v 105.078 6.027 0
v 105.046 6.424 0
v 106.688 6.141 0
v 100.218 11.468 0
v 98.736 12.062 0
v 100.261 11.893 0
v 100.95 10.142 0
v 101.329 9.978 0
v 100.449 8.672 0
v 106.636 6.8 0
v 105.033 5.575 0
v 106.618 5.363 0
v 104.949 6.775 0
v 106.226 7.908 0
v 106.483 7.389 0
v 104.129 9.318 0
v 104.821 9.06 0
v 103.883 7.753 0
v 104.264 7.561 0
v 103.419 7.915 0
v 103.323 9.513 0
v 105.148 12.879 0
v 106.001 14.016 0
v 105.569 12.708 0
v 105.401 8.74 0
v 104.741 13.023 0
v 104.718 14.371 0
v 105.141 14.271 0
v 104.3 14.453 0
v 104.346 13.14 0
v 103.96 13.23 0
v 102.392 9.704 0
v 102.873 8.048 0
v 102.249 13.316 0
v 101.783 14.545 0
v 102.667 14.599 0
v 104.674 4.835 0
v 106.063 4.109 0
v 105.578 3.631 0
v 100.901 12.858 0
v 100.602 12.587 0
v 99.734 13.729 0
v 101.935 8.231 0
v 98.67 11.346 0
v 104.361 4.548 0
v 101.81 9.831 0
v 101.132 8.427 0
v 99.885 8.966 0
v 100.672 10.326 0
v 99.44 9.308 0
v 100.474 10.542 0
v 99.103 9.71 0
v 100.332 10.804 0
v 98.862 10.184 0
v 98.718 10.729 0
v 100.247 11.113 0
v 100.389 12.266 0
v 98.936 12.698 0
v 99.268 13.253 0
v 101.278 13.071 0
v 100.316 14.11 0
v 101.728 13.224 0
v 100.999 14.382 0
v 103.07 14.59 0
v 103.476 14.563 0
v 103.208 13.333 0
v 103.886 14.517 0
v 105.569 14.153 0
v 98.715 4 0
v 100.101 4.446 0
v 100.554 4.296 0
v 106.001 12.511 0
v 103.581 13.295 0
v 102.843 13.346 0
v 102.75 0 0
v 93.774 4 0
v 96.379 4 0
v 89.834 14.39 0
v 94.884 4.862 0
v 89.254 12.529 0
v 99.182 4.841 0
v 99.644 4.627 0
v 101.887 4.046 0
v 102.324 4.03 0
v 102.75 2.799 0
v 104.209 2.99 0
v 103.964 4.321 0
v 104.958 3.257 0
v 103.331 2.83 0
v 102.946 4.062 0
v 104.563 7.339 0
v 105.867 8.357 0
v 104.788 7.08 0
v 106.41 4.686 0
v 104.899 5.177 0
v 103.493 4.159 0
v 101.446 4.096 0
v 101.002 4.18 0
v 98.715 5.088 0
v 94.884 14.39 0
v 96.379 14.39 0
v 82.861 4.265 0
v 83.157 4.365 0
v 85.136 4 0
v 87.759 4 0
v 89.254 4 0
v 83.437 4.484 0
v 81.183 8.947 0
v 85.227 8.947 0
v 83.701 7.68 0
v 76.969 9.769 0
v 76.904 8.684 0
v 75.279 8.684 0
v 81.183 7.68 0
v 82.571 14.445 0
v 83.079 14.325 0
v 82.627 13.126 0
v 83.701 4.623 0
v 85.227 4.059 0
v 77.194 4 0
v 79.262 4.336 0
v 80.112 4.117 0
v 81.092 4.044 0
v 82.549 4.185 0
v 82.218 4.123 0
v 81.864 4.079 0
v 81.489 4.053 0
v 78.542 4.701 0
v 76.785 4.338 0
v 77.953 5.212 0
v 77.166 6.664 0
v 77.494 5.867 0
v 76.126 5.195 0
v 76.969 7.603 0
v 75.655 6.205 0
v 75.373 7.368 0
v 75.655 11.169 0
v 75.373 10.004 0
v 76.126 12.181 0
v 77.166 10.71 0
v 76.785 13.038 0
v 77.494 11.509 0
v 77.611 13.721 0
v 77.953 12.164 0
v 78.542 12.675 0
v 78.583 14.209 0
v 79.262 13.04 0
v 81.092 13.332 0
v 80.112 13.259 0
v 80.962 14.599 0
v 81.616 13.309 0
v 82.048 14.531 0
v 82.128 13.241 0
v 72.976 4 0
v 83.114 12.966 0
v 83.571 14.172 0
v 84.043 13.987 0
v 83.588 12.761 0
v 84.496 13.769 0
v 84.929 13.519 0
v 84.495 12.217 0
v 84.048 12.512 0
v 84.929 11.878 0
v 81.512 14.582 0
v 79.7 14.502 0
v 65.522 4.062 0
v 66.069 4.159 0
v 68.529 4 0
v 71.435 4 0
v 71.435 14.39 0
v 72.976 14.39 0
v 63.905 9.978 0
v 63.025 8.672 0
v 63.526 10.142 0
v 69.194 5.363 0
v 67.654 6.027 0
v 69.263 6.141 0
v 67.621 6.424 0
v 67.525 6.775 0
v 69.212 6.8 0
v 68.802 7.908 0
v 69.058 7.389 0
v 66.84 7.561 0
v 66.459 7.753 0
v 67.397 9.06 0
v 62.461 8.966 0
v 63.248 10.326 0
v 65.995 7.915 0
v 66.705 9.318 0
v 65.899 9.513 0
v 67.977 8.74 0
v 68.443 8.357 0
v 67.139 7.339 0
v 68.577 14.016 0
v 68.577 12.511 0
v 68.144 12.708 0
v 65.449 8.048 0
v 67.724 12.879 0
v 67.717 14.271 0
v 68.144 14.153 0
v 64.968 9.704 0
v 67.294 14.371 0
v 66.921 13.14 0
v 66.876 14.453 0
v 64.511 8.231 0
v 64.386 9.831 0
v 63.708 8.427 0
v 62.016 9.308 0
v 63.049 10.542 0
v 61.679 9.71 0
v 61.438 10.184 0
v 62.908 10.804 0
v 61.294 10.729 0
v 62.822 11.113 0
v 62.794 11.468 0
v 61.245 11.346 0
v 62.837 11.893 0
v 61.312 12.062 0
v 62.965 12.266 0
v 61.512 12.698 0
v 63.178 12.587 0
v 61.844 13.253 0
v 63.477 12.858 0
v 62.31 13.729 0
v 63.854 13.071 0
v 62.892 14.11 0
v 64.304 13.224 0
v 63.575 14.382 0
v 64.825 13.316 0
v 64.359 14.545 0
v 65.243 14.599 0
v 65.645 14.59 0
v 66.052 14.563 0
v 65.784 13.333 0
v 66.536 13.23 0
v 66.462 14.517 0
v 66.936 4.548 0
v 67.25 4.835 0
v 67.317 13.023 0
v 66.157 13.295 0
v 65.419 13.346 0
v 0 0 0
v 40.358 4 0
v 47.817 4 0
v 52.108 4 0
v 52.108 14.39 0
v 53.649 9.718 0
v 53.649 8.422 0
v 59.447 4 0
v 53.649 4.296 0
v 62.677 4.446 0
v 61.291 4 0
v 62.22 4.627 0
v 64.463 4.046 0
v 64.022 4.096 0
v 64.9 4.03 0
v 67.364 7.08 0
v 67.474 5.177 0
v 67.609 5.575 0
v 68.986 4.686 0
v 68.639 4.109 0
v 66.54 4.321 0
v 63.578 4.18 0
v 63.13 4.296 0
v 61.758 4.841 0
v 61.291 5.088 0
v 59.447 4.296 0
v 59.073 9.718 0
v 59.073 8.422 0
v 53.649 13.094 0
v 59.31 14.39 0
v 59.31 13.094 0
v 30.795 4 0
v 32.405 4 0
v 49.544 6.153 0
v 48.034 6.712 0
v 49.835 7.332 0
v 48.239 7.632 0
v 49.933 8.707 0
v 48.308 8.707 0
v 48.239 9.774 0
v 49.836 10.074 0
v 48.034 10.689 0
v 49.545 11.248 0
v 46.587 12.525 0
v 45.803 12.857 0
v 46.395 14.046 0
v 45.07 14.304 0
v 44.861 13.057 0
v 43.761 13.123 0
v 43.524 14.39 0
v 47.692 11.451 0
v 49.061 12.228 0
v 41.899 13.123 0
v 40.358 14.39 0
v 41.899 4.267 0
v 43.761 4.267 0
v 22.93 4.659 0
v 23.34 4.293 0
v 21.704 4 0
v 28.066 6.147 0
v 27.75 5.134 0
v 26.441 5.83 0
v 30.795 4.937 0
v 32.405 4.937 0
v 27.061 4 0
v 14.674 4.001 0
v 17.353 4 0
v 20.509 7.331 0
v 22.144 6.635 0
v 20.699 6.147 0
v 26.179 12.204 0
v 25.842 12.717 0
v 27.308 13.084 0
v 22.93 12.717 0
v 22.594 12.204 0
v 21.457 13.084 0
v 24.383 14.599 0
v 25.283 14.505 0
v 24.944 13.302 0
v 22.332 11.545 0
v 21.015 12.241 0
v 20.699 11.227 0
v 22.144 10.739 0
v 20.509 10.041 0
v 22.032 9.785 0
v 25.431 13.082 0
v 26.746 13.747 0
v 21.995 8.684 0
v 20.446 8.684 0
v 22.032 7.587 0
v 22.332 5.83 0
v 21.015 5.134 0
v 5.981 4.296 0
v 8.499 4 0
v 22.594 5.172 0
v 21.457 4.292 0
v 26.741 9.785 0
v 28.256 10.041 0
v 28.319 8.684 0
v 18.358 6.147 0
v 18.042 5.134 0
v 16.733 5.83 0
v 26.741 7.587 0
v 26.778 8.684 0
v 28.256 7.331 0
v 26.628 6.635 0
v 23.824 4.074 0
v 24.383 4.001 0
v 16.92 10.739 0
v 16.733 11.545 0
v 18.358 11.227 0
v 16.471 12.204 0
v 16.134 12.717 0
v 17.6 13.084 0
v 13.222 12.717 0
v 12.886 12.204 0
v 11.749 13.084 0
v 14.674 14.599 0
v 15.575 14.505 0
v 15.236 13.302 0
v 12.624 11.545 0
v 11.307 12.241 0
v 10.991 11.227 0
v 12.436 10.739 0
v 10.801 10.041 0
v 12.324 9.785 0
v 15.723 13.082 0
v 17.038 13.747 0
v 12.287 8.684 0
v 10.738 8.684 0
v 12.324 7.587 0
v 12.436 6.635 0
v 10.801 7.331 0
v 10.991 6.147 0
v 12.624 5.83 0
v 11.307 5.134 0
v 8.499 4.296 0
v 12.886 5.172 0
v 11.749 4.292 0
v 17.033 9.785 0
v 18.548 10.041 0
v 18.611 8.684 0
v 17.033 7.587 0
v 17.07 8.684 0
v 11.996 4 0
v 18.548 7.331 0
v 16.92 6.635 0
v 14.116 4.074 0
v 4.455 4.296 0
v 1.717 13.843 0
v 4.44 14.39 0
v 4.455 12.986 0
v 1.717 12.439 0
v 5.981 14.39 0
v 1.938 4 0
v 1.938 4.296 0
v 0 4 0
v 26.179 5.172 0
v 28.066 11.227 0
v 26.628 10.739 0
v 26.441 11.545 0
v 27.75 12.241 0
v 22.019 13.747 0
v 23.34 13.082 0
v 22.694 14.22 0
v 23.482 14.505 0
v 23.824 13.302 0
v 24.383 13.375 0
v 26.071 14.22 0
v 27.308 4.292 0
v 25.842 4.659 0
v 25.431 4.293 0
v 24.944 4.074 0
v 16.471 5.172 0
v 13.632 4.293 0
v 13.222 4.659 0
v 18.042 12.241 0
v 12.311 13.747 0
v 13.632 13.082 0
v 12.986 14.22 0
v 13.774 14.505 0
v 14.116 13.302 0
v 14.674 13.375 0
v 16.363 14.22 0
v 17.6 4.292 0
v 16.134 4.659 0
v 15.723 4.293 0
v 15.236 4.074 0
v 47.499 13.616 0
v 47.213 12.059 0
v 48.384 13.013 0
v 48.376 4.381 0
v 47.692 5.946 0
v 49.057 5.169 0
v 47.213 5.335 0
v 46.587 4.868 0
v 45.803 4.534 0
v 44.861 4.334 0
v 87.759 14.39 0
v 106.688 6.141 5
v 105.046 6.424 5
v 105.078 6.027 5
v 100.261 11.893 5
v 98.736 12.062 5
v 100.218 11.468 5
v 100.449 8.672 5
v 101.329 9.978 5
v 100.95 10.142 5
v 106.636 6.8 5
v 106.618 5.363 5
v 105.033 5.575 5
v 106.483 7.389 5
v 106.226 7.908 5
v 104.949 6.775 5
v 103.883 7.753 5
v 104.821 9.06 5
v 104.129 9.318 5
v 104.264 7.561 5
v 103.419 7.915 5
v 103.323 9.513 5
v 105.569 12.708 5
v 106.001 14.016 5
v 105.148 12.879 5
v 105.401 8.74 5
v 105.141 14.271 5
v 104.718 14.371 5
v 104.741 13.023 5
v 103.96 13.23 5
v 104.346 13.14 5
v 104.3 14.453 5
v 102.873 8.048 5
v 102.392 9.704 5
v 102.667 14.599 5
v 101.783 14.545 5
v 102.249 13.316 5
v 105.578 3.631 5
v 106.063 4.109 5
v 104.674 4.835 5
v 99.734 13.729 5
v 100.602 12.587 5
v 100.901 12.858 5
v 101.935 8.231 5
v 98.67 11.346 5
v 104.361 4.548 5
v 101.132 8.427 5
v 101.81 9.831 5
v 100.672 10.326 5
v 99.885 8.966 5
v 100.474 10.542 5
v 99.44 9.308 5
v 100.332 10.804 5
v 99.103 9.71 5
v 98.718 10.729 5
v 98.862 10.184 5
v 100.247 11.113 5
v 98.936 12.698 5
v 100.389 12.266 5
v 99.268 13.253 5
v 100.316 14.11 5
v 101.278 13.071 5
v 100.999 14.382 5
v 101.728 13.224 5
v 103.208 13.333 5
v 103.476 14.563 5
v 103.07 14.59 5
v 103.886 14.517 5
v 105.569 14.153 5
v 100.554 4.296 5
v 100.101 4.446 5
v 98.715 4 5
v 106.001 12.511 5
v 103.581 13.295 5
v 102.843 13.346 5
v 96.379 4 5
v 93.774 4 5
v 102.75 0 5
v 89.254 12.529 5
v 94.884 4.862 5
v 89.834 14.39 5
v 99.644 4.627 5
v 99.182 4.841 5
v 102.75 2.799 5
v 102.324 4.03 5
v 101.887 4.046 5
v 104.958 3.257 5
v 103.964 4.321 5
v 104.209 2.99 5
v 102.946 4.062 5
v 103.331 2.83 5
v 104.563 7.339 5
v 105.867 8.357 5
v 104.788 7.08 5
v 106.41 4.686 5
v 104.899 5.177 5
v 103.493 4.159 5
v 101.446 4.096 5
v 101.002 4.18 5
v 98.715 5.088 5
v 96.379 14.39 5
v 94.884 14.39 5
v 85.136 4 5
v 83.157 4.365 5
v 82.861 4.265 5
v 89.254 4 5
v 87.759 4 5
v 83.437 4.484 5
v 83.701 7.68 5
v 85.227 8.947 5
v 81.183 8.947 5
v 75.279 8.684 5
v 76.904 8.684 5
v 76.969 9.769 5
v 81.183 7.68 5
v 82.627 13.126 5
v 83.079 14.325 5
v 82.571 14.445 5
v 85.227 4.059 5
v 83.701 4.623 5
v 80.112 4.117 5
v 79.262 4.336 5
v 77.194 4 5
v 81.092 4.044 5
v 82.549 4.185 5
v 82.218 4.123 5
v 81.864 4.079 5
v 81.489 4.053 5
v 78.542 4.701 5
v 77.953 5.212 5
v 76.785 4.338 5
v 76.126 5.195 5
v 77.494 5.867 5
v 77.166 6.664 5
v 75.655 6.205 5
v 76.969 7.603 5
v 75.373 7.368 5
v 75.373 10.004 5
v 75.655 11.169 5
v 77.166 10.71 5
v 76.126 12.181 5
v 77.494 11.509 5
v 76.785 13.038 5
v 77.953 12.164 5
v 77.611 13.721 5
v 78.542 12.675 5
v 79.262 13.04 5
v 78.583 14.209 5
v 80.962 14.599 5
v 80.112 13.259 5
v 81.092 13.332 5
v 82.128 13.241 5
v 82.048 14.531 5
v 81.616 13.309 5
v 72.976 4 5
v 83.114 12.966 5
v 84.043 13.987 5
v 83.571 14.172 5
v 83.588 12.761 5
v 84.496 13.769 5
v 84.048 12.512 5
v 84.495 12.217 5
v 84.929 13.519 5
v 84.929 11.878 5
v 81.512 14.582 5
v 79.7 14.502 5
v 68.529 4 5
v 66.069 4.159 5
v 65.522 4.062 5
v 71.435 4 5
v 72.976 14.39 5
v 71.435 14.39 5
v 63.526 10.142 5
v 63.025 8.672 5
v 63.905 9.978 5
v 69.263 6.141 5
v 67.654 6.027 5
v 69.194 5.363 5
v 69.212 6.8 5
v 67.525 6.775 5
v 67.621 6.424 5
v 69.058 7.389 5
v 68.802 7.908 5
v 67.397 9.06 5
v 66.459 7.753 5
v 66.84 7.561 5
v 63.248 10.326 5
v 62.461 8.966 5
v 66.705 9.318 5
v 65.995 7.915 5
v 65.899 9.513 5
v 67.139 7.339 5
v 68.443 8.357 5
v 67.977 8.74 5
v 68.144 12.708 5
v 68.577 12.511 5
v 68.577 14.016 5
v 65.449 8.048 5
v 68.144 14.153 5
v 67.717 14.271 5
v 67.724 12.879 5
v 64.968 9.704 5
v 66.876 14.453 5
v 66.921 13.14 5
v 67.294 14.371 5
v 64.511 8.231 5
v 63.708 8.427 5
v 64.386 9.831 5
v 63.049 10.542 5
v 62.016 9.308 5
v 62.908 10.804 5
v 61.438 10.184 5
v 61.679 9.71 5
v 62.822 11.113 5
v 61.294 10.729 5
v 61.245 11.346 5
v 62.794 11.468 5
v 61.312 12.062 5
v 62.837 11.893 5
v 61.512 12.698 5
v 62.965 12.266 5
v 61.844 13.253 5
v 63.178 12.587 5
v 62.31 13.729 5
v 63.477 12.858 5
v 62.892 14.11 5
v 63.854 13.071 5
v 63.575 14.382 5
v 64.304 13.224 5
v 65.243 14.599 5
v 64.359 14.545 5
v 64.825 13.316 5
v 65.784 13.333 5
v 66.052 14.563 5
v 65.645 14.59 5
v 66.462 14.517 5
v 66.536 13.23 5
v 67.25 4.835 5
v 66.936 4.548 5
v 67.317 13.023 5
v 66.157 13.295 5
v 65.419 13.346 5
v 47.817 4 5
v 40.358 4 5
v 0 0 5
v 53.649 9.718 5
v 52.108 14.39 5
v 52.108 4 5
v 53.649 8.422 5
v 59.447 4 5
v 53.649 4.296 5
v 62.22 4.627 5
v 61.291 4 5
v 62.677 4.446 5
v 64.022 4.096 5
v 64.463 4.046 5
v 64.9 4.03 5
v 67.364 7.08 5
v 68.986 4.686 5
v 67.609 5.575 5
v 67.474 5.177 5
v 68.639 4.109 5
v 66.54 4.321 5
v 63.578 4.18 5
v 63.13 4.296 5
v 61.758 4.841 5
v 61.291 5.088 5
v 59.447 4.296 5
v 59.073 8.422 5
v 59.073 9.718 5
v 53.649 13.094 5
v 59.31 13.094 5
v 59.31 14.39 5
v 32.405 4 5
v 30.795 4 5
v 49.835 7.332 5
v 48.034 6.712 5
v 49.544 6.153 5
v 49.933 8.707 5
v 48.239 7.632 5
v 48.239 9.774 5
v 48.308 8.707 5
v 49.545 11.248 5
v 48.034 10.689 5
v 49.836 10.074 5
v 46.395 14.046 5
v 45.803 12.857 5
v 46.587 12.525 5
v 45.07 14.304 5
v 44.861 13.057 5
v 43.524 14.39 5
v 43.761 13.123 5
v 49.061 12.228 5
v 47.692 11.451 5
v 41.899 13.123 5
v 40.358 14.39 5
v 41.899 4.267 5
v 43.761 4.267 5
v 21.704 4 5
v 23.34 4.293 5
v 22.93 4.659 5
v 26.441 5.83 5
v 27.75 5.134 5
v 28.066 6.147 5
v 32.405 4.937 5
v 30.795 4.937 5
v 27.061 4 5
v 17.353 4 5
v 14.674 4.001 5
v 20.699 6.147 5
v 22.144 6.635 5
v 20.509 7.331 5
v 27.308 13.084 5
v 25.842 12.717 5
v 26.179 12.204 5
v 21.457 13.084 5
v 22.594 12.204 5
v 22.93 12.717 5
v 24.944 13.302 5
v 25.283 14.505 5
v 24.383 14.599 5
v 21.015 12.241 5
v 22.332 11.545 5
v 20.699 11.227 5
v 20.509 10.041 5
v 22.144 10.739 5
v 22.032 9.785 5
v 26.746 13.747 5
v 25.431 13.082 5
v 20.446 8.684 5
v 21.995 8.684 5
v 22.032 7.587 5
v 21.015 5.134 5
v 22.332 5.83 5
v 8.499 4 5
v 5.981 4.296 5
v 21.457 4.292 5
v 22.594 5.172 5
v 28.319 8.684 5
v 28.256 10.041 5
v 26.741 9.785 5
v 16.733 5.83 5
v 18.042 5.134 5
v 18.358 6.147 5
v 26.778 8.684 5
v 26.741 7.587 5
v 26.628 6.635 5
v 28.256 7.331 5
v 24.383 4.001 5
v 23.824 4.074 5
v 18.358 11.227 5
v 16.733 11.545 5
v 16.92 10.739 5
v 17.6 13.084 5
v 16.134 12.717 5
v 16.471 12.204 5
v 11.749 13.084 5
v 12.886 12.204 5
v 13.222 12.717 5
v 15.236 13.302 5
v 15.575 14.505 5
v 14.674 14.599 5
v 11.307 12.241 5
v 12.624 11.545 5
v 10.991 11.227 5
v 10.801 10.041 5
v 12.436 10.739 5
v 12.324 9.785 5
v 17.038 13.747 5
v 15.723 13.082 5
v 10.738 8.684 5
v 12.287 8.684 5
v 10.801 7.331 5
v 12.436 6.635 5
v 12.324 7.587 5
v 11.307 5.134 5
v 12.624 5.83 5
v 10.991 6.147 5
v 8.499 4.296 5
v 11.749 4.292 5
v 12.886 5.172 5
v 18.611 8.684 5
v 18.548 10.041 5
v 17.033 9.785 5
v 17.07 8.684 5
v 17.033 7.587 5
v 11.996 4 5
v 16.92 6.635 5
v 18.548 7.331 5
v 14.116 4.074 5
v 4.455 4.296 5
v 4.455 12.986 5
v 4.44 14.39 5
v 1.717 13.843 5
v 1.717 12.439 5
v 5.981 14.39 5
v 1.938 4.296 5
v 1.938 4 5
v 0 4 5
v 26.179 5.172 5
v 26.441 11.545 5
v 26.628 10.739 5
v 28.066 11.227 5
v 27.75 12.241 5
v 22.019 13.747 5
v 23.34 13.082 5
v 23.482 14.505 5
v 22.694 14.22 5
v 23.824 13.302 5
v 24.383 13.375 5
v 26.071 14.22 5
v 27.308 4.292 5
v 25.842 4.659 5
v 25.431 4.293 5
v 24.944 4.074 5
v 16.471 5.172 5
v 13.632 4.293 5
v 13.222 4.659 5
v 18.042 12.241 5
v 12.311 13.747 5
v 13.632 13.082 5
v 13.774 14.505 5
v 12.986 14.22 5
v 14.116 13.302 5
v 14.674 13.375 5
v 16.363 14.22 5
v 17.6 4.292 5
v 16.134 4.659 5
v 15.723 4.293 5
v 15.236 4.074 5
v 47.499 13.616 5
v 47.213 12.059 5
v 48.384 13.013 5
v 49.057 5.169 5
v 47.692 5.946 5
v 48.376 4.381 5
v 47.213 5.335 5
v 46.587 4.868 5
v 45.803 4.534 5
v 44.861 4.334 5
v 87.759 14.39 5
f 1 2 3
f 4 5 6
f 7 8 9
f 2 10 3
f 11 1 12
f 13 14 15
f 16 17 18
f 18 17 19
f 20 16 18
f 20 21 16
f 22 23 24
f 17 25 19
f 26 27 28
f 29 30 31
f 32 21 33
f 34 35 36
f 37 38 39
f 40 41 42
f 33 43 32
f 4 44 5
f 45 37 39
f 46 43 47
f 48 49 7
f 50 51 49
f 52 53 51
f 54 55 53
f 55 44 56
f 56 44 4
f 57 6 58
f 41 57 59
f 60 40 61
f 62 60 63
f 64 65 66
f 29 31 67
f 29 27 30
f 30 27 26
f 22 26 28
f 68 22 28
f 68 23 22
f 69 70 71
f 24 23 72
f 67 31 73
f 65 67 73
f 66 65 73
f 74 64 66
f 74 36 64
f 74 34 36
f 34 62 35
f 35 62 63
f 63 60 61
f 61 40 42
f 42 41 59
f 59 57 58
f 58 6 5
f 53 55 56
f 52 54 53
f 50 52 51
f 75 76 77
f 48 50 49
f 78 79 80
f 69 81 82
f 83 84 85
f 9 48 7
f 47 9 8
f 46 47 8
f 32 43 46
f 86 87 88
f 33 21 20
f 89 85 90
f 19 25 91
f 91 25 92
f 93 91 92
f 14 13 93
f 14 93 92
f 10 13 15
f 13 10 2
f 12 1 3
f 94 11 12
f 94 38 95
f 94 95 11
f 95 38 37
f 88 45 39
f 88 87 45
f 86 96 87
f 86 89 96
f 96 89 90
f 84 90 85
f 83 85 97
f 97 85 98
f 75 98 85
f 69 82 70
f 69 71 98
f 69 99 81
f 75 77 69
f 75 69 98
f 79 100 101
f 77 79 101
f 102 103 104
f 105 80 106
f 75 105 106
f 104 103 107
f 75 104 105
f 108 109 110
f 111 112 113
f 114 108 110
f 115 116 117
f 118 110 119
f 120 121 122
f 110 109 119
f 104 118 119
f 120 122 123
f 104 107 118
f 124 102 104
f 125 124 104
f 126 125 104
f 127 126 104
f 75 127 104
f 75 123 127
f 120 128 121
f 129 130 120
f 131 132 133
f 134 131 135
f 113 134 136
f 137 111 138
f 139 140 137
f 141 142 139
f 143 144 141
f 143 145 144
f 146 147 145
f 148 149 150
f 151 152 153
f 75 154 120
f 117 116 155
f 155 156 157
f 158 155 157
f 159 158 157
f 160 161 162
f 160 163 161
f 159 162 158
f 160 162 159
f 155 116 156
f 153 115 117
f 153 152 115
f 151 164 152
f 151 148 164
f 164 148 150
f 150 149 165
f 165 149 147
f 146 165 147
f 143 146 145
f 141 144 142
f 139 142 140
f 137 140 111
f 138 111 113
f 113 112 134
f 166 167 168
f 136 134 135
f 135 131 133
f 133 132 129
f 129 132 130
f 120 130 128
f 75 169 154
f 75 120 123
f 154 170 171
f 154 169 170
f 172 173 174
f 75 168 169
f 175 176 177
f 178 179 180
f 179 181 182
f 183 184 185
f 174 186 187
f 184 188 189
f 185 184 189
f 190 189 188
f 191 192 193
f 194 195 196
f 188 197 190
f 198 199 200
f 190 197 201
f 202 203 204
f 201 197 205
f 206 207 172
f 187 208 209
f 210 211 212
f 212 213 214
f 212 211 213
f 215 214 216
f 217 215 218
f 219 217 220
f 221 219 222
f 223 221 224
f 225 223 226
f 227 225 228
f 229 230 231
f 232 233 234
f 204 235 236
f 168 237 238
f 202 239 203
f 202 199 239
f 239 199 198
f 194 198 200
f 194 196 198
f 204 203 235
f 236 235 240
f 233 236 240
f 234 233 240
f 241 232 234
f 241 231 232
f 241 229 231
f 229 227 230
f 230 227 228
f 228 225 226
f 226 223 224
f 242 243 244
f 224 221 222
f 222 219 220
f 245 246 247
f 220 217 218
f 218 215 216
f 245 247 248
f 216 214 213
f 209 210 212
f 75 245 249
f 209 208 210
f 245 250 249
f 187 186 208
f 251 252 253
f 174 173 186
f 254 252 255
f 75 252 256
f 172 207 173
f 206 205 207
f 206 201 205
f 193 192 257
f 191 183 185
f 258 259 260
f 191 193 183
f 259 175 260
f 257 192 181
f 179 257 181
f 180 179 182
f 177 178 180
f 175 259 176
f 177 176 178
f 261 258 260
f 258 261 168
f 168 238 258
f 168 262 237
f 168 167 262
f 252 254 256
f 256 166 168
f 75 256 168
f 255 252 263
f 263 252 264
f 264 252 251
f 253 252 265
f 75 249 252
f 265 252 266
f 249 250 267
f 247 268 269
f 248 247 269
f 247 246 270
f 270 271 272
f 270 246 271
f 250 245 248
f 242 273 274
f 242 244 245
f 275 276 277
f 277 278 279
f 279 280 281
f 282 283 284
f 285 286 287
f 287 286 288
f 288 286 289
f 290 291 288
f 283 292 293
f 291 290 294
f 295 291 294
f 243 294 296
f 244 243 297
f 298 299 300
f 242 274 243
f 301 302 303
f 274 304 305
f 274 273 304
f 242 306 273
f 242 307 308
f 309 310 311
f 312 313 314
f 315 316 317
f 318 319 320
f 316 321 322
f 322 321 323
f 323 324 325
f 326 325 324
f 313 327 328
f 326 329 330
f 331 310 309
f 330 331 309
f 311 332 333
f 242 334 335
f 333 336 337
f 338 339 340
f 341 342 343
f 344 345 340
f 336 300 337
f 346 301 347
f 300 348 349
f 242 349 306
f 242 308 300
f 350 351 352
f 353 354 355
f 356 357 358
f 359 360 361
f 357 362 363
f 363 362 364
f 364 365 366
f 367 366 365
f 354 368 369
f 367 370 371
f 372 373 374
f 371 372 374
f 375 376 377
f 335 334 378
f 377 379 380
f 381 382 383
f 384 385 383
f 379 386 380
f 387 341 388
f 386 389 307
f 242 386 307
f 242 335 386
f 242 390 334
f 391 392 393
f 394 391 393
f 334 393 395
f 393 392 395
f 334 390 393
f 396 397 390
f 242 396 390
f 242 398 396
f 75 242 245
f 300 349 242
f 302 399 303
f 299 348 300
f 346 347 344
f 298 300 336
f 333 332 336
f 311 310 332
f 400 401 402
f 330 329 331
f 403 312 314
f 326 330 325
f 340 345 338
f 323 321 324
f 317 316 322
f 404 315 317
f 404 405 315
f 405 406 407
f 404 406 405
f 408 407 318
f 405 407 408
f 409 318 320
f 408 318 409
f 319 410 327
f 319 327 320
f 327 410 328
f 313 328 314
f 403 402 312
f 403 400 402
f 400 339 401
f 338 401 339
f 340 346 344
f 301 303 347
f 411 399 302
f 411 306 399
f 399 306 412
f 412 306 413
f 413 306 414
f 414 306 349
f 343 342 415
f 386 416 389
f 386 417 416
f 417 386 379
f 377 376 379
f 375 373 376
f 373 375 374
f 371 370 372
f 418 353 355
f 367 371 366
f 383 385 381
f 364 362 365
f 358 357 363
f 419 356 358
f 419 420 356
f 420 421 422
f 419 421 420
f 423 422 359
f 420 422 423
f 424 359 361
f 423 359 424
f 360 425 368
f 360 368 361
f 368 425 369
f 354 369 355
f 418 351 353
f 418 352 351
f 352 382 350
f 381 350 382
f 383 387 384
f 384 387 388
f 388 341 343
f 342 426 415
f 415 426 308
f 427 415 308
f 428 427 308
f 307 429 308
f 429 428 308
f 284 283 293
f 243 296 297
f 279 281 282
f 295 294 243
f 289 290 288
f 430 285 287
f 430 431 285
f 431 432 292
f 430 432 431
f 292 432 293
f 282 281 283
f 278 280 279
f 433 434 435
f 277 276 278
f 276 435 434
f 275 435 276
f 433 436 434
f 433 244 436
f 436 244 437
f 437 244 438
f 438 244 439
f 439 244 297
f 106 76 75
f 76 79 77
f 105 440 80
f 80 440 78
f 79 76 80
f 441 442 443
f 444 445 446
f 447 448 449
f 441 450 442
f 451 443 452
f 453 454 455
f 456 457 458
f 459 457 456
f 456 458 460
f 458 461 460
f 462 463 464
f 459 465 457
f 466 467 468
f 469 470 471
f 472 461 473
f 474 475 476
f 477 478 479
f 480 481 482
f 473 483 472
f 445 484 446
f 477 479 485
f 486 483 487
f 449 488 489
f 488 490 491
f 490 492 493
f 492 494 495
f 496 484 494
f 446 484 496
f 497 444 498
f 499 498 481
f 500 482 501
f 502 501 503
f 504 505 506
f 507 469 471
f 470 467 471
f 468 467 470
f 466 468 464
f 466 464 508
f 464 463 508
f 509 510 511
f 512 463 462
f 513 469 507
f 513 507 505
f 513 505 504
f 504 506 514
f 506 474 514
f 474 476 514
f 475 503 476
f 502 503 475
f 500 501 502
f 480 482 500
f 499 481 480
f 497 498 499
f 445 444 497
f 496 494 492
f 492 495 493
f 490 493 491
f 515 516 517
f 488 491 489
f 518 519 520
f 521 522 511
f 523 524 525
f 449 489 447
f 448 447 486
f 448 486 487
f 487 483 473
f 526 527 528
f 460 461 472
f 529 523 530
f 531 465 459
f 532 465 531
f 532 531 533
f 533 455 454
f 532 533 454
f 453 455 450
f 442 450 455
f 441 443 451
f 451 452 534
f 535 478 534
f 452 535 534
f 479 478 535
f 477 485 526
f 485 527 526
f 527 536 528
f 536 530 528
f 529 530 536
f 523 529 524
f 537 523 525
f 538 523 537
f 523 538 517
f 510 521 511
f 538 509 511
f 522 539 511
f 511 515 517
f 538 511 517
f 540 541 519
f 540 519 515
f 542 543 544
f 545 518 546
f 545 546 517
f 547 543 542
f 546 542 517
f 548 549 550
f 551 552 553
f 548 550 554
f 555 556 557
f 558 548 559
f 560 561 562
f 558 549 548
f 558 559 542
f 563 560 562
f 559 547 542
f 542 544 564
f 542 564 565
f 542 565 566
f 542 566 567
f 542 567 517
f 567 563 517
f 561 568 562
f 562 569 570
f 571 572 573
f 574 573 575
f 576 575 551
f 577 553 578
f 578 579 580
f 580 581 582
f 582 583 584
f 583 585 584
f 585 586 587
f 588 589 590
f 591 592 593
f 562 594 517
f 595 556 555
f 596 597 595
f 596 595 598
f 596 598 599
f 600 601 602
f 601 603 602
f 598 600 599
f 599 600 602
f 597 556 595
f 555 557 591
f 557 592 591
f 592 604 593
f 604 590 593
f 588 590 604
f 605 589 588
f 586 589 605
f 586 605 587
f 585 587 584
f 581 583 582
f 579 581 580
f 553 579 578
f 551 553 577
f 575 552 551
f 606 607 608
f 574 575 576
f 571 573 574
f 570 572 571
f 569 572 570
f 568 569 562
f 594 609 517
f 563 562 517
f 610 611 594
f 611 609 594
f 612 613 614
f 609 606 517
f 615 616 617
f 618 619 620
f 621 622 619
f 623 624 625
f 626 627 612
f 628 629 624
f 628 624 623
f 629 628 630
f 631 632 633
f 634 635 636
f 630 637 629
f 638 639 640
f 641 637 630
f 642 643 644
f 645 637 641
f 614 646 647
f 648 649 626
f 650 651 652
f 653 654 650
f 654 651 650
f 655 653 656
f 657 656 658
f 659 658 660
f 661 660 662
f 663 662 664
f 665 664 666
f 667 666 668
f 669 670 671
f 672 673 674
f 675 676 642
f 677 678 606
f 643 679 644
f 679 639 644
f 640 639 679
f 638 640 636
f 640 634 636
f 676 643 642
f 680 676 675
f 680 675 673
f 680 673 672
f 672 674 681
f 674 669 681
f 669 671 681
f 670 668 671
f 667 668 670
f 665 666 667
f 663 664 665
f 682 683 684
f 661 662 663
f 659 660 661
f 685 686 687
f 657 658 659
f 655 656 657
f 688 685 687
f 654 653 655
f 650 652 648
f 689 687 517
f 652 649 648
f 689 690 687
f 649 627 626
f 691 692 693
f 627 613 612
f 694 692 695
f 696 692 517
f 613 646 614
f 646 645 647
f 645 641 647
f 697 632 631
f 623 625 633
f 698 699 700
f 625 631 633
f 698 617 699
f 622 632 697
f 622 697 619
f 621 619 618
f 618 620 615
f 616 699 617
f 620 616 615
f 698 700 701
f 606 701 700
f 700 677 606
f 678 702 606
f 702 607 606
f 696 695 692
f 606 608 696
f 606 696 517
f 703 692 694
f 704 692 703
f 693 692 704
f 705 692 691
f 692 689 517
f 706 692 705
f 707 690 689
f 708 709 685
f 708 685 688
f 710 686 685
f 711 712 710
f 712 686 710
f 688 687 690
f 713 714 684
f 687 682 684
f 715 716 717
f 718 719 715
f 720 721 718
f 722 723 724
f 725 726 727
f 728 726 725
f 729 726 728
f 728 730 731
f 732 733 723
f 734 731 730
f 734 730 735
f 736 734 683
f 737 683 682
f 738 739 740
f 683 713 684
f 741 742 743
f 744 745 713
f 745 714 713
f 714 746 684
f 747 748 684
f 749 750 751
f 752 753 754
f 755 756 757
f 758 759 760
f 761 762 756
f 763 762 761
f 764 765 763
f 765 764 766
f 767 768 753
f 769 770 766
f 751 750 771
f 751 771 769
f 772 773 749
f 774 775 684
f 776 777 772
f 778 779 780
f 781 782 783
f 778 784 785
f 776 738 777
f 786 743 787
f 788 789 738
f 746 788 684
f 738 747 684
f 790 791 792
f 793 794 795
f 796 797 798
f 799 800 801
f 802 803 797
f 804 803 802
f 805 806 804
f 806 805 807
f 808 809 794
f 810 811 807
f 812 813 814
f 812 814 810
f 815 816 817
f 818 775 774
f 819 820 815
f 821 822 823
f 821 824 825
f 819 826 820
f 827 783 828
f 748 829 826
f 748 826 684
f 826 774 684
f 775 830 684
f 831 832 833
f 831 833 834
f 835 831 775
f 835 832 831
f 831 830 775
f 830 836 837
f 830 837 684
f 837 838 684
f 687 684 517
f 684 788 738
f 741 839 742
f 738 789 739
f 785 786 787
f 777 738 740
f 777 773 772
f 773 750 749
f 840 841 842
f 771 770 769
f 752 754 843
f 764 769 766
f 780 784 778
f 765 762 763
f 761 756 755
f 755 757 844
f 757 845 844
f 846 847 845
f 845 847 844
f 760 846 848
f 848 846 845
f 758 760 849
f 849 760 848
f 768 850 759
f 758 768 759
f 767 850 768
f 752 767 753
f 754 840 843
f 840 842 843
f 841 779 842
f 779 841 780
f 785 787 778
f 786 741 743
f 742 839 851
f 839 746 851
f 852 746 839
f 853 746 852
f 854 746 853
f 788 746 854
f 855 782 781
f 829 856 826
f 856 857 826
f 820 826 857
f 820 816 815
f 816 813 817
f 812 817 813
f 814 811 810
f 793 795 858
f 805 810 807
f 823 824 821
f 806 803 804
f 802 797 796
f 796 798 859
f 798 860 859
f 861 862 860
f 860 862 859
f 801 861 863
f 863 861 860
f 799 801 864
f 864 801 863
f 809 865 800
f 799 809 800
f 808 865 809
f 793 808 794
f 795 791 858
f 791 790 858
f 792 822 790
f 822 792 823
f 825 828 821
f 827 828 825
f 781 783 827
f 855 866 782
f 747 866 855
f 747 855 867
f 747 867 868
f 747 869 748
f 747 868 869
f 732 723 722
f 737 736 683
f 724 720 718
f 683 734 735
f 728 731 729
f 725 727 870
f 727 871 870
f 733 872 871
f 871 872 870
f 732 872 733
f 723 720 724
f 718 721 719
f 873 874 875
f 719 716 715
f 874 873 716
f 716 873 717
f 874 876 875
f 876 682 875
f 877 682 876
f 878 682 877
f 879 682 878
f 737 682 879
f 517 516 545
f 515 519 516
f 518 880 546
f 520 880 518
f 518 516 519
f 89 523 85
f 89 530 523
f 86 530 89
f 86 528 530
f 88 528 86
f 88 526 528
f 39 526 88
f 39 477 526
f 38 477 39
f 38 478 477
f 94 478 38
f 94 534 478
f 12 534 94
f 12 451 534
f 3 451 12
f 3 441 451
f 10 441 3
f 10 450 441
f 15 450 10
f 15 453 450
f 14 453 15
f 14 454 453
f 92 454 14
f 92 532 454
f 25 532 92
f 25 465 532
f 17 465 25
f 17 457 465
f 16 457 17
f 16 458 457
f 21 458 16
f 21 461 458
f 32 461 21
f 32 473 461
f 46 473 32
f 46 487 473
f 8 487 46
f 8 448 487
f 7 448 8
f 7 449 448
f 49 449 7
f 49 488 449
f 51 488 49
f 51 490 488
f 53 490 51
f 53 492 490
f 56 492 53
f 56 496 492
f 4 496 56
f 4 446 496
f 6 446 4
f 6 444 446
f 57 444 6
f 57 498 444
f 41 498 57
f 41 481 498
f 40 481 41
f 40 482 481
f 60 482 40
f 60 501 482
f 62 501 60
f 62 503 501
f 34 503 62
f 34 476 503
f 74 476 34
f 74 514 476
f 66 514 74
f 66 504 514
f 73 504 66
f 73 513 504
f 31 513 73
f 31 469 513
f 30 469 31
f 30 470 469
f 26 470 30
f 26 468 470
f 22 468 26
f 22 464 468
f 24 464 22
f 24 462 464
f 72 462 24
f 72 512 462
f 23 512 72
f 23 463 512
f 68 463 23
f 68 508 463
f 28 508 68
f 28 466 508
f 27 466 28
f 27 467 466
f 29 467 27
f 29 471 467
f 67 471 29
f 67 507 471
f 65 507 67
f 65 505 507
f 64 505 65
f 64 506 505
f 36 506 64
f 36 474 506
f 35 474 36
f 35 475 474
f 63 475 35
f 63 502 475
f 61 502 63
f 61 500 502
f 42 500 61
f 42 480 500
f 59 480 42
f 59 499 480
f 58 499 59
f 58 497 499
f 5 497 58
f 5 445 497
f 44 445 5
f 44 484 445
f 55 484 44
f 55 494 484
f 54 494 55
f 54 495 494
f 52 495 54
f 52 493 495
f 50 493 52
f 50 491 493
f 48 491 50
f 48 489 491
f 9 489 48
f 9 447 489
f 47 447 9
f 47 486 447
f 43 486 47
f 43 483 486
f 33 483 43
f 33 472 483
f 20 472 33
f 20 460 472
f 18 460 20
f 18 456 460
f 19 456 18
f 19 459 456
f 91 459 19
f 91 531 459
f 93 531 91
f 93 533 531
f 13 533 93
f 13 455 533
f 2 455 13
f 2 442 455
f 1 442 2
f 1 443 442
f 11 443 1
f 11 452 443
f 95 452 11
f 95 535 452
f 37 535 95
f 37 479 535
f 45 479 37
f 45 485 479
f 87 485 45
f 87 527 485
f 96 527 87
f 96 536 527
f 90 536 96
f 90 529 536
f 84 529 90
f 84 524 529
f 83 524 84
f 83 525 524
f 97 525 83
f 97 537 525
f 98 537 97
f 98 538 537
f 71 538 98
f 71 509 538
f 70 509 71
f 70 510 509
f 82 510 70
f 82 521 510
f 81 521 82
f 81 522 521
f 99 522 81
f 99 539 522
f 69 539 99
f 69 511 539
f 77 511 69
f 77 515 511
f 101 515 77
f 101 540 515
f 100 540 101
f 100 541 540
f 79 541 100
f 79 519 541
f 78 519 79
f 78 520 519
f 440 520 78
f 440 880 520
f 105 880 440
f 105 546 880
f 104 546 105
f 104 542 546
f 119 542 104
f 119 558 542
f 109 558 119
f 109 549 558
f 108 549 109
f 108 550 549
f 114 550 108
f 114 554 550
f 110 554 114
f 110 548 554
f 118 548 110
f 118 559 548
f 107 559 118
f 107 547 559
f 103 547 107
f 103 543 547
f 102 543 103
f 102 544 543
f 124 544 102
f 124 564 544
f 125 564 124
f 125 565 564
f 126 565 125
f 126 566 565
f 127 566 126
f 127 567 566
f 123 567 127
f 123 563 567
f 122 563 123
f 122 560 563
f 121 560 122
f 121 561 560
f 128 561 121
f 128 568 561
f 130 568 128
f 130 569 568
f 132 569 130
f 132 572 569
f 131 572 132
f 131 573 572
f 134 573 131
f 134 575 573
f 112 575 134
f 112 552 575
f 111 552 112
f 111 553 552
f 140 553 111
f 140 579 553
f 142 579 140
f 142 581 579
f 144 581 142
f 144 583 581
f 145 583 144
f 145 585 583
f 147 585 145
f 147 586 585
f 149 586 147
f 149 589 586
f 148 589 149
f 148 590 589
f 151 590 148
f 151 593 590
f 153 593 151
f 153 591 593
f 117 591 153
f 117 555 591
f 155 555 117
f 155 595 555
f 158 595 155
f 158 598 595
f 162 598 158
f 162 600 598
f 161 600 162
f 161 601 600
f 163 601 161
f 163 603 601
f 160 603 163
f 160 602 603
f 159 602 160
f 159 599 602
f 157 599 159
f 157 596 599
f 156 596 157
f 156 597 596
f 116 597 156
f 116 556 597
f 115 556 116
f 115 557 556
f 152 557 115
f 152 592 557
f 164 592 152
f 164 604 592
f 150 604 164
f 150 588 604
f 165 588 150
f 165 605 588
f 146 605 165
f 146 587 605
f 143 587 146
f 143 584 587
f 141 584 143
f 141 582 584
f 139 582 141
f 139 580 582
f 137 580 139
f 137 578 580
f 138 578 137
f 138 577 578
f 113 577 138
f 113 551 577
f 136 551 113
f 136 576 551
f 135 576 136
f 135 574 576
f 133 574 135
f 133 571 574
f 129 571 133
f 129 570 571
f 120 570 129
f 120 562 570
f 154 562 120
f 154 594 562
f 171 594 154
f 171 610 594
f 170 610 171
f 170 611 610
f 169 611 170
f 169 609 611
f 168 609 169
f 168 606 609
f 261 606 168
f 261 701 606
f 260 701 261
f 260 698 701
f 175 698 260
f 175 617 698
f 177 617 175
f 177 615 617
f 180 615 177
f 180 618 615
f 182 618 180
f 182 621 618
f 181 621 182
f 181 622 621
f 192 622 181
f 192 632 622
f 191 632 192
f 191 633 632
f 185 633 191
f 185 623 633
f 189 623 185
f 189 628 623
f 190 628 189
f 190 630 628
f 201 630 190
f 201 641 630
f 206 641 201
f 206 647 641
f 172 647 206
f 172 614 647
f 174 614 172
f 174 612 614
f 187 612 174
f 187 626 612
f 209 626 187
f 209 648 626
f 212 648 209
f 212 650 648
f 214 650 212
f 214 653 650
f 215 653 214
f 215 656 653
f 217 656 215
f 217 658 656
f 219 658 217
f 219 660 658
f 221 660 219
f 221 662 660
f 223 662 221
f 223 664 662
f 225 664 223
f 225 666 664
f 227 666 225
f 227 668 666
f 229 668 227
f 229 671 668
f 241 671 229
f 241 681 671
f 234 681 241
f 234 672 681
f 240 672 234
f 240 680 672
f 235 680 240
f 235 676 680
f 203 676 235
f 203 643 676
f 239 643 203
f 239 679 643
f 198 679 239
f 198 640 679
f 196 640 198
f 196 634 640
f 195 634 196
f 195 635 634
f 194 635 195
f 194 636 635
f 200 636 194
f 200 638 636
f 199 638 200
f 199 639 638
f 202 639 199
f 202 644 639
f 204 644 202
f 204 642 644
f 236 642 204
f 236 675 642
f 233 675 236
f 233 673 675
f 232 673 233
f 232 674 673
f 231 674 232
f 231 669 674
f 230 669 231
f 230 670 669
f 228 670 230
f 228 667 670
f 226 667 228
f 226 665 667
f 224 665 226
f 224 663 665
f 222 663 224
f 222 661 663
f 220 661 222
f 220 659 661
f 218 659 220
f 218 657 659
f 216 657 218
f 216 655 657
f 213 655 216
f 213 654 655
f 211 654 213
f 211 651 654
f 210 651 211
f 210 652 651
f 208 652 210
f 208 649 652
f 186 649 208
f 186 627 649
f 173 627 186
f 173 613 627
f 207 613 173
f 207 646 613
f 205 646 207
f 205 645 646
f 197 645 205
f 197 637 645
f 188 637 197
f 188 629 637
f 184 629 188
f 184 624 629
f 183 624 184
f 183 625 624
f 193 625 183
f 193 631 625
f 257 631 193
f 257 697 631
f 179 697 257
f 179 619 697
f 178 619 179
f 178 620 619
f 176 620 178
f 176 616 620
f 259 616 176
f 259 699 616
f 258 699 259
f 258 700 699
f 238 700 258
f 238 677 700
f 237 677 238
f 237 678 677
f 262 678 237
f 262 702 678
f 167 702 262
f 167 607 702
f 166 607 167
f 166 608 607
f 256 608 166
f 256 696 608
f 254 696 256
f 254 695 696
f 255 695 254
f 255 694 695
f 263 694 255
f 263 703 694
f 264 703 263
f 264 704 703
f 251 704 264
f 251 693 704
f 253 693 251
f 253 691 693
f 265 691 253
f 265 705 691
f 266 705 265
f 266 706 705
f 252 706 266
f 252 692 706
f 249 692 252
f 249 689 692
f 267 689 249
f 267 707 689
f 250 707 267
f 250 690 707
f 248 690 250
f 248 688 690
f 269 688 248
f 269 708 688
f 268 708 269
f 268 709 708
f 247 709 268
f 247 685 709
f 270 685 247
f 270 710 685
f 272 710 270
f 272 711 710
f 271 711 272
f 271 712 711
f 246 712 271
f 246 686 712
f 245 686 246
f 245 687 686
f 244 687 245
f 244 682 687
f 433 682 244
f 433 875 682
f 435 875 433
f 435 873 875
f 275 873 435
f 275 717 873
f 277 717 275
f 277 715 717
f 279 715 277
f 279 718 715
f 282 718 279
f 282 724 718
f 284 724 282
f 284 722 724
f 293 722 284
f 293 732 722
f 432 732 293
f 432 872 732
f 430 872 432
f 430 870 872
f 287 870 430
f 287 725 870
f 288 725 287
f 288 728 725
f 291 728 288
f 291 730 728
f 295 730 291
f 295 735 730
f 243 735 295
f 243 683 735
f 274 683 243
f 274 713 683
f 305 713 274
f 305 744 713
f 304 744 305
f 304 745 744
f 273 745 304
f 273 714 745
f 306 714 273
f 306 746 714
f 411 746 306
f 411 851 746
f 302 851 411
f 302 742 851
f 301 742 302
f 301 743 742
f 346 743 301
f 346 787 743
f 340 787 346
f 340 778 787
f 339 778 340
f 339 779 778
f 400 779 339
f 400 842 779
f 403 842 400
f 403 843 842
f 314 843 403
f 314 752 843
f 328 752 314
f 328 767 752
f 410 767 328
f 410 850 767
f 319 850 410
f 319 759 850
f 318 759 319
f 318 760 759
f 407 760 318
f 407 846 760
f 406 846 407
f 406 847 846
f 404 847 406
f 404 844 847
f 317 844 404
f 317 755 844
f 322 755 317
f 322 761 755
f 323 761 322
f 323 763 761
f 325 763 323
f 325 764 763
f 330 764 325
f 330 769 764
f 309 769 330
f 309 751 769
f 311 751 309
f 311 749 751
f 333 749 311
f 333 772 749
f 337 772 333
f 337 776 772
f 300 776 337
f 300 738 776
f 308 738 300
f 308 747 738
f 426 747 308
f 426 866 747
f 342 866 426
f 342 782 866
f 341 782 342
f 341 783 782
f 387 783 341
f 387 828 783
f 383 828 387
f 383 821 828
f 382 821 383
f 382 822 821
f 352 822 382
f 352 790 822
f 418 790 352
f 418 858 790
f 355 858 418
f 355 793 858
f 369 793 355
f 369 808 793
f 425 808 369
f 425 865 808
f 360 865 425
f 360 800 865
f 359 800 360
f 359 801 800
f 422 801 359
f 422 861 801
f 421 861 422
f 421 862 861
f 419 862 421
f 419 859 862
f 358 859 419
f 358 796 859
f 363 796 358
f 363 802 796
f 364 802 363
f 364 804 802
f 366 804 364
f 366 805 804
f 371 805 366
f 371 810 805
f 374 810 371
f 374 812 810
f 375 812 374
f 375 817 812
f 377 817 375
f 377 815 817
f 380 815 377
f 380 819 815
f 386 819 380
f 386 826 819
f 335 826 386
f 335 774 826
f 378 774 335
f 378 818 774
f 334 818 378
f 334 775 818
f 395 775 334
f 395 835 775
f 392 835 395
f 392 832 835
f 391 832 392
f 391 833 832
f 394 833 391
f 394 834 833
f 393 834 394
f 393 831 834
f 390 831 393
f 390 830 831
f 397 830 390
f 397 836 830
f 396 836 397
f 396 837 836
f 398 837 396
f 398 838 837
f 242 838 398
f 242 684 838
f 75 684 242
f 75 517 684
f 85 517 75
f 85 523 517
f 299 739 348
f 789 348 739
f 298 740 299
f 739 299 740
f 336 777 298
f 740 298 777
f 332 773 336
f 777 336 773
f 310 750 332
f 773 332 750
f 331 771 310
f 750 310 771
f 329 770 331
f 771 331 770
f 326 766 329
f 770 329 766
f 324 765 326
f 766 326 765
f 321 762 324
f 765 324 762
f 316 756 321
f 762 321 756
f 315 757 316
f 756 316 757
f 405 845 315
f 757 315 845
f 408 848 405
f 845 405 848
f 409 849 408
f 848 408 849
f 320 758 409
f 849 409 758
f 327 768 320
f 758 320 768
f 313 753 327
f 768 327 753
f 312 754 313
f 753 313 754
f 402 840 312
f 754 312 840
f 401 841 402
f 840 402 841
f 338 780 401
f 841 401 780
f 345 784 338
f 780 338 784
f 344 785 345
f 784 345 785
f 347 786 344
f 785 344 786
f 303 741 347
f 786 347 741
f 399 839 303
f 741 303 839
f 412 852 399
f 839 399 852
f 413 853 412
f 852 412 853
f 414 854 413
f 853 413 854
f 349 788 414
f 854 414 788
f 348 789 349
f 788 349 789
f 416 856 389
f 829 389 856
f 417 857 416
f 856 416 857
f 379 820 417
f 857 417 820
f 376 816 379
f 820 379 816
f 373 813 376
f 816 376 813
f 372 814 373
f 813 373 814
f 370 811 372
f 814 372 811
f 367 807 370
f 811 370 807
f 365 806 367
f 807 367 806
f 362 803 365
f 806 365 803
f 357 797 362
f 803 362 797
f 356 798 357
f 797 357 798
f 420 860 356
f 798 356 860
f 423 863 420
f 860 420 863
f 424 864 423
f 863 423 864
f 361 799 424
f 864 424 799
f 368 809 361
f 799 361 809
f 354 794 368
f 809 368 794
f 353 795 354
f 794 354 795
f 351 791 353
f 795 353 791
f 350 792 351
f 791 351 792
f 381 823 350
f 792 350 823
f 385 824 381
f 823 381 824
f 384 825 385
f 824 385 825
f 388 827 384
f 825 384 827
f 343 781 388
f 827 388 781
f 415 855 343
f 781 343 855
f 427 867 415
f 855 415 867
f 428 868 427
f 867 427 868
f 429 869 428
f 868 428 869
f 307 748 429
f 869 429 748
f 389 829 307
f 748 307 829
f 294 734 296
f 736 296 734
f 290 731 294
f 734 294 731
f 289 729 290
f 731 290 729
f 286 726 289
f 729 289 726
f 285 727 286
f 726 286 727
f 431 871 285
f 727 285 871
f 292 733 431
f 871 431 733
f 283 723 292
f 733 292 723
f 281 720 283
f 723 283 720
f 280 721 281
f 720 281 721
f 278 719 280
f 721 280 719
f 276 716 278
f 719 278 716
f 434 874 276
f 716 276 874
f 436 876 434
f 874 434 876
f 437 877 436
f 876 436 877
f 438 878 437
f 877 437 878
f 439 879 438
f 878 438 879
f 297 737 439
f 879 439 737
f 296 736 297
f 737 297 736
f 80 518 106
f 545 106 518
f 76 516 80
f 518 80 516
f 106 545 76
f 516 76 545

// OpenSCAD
// hight of thelabel (=depth)
height = 5;
//Your Text
Text2 = "100. DESIGNS";
//Font size
Size = 15;
// Base legth fine tune in mm 
base_legth = 15;
linear_extrude( height=height, twist=0, scale=[1, 1], center=false){
  union(){
    translate([0, 3, 0]){
      // size is multiplied by 0.75 because openScad fonts size is in points, not pixels
      text(str(Text2), font = "Comic Sans MS", size = Size* 0.75);

    }
    square([(len(Text2) * (Size * 0.39))*1.25 + base_legth, 4], center=false);
  }
}
